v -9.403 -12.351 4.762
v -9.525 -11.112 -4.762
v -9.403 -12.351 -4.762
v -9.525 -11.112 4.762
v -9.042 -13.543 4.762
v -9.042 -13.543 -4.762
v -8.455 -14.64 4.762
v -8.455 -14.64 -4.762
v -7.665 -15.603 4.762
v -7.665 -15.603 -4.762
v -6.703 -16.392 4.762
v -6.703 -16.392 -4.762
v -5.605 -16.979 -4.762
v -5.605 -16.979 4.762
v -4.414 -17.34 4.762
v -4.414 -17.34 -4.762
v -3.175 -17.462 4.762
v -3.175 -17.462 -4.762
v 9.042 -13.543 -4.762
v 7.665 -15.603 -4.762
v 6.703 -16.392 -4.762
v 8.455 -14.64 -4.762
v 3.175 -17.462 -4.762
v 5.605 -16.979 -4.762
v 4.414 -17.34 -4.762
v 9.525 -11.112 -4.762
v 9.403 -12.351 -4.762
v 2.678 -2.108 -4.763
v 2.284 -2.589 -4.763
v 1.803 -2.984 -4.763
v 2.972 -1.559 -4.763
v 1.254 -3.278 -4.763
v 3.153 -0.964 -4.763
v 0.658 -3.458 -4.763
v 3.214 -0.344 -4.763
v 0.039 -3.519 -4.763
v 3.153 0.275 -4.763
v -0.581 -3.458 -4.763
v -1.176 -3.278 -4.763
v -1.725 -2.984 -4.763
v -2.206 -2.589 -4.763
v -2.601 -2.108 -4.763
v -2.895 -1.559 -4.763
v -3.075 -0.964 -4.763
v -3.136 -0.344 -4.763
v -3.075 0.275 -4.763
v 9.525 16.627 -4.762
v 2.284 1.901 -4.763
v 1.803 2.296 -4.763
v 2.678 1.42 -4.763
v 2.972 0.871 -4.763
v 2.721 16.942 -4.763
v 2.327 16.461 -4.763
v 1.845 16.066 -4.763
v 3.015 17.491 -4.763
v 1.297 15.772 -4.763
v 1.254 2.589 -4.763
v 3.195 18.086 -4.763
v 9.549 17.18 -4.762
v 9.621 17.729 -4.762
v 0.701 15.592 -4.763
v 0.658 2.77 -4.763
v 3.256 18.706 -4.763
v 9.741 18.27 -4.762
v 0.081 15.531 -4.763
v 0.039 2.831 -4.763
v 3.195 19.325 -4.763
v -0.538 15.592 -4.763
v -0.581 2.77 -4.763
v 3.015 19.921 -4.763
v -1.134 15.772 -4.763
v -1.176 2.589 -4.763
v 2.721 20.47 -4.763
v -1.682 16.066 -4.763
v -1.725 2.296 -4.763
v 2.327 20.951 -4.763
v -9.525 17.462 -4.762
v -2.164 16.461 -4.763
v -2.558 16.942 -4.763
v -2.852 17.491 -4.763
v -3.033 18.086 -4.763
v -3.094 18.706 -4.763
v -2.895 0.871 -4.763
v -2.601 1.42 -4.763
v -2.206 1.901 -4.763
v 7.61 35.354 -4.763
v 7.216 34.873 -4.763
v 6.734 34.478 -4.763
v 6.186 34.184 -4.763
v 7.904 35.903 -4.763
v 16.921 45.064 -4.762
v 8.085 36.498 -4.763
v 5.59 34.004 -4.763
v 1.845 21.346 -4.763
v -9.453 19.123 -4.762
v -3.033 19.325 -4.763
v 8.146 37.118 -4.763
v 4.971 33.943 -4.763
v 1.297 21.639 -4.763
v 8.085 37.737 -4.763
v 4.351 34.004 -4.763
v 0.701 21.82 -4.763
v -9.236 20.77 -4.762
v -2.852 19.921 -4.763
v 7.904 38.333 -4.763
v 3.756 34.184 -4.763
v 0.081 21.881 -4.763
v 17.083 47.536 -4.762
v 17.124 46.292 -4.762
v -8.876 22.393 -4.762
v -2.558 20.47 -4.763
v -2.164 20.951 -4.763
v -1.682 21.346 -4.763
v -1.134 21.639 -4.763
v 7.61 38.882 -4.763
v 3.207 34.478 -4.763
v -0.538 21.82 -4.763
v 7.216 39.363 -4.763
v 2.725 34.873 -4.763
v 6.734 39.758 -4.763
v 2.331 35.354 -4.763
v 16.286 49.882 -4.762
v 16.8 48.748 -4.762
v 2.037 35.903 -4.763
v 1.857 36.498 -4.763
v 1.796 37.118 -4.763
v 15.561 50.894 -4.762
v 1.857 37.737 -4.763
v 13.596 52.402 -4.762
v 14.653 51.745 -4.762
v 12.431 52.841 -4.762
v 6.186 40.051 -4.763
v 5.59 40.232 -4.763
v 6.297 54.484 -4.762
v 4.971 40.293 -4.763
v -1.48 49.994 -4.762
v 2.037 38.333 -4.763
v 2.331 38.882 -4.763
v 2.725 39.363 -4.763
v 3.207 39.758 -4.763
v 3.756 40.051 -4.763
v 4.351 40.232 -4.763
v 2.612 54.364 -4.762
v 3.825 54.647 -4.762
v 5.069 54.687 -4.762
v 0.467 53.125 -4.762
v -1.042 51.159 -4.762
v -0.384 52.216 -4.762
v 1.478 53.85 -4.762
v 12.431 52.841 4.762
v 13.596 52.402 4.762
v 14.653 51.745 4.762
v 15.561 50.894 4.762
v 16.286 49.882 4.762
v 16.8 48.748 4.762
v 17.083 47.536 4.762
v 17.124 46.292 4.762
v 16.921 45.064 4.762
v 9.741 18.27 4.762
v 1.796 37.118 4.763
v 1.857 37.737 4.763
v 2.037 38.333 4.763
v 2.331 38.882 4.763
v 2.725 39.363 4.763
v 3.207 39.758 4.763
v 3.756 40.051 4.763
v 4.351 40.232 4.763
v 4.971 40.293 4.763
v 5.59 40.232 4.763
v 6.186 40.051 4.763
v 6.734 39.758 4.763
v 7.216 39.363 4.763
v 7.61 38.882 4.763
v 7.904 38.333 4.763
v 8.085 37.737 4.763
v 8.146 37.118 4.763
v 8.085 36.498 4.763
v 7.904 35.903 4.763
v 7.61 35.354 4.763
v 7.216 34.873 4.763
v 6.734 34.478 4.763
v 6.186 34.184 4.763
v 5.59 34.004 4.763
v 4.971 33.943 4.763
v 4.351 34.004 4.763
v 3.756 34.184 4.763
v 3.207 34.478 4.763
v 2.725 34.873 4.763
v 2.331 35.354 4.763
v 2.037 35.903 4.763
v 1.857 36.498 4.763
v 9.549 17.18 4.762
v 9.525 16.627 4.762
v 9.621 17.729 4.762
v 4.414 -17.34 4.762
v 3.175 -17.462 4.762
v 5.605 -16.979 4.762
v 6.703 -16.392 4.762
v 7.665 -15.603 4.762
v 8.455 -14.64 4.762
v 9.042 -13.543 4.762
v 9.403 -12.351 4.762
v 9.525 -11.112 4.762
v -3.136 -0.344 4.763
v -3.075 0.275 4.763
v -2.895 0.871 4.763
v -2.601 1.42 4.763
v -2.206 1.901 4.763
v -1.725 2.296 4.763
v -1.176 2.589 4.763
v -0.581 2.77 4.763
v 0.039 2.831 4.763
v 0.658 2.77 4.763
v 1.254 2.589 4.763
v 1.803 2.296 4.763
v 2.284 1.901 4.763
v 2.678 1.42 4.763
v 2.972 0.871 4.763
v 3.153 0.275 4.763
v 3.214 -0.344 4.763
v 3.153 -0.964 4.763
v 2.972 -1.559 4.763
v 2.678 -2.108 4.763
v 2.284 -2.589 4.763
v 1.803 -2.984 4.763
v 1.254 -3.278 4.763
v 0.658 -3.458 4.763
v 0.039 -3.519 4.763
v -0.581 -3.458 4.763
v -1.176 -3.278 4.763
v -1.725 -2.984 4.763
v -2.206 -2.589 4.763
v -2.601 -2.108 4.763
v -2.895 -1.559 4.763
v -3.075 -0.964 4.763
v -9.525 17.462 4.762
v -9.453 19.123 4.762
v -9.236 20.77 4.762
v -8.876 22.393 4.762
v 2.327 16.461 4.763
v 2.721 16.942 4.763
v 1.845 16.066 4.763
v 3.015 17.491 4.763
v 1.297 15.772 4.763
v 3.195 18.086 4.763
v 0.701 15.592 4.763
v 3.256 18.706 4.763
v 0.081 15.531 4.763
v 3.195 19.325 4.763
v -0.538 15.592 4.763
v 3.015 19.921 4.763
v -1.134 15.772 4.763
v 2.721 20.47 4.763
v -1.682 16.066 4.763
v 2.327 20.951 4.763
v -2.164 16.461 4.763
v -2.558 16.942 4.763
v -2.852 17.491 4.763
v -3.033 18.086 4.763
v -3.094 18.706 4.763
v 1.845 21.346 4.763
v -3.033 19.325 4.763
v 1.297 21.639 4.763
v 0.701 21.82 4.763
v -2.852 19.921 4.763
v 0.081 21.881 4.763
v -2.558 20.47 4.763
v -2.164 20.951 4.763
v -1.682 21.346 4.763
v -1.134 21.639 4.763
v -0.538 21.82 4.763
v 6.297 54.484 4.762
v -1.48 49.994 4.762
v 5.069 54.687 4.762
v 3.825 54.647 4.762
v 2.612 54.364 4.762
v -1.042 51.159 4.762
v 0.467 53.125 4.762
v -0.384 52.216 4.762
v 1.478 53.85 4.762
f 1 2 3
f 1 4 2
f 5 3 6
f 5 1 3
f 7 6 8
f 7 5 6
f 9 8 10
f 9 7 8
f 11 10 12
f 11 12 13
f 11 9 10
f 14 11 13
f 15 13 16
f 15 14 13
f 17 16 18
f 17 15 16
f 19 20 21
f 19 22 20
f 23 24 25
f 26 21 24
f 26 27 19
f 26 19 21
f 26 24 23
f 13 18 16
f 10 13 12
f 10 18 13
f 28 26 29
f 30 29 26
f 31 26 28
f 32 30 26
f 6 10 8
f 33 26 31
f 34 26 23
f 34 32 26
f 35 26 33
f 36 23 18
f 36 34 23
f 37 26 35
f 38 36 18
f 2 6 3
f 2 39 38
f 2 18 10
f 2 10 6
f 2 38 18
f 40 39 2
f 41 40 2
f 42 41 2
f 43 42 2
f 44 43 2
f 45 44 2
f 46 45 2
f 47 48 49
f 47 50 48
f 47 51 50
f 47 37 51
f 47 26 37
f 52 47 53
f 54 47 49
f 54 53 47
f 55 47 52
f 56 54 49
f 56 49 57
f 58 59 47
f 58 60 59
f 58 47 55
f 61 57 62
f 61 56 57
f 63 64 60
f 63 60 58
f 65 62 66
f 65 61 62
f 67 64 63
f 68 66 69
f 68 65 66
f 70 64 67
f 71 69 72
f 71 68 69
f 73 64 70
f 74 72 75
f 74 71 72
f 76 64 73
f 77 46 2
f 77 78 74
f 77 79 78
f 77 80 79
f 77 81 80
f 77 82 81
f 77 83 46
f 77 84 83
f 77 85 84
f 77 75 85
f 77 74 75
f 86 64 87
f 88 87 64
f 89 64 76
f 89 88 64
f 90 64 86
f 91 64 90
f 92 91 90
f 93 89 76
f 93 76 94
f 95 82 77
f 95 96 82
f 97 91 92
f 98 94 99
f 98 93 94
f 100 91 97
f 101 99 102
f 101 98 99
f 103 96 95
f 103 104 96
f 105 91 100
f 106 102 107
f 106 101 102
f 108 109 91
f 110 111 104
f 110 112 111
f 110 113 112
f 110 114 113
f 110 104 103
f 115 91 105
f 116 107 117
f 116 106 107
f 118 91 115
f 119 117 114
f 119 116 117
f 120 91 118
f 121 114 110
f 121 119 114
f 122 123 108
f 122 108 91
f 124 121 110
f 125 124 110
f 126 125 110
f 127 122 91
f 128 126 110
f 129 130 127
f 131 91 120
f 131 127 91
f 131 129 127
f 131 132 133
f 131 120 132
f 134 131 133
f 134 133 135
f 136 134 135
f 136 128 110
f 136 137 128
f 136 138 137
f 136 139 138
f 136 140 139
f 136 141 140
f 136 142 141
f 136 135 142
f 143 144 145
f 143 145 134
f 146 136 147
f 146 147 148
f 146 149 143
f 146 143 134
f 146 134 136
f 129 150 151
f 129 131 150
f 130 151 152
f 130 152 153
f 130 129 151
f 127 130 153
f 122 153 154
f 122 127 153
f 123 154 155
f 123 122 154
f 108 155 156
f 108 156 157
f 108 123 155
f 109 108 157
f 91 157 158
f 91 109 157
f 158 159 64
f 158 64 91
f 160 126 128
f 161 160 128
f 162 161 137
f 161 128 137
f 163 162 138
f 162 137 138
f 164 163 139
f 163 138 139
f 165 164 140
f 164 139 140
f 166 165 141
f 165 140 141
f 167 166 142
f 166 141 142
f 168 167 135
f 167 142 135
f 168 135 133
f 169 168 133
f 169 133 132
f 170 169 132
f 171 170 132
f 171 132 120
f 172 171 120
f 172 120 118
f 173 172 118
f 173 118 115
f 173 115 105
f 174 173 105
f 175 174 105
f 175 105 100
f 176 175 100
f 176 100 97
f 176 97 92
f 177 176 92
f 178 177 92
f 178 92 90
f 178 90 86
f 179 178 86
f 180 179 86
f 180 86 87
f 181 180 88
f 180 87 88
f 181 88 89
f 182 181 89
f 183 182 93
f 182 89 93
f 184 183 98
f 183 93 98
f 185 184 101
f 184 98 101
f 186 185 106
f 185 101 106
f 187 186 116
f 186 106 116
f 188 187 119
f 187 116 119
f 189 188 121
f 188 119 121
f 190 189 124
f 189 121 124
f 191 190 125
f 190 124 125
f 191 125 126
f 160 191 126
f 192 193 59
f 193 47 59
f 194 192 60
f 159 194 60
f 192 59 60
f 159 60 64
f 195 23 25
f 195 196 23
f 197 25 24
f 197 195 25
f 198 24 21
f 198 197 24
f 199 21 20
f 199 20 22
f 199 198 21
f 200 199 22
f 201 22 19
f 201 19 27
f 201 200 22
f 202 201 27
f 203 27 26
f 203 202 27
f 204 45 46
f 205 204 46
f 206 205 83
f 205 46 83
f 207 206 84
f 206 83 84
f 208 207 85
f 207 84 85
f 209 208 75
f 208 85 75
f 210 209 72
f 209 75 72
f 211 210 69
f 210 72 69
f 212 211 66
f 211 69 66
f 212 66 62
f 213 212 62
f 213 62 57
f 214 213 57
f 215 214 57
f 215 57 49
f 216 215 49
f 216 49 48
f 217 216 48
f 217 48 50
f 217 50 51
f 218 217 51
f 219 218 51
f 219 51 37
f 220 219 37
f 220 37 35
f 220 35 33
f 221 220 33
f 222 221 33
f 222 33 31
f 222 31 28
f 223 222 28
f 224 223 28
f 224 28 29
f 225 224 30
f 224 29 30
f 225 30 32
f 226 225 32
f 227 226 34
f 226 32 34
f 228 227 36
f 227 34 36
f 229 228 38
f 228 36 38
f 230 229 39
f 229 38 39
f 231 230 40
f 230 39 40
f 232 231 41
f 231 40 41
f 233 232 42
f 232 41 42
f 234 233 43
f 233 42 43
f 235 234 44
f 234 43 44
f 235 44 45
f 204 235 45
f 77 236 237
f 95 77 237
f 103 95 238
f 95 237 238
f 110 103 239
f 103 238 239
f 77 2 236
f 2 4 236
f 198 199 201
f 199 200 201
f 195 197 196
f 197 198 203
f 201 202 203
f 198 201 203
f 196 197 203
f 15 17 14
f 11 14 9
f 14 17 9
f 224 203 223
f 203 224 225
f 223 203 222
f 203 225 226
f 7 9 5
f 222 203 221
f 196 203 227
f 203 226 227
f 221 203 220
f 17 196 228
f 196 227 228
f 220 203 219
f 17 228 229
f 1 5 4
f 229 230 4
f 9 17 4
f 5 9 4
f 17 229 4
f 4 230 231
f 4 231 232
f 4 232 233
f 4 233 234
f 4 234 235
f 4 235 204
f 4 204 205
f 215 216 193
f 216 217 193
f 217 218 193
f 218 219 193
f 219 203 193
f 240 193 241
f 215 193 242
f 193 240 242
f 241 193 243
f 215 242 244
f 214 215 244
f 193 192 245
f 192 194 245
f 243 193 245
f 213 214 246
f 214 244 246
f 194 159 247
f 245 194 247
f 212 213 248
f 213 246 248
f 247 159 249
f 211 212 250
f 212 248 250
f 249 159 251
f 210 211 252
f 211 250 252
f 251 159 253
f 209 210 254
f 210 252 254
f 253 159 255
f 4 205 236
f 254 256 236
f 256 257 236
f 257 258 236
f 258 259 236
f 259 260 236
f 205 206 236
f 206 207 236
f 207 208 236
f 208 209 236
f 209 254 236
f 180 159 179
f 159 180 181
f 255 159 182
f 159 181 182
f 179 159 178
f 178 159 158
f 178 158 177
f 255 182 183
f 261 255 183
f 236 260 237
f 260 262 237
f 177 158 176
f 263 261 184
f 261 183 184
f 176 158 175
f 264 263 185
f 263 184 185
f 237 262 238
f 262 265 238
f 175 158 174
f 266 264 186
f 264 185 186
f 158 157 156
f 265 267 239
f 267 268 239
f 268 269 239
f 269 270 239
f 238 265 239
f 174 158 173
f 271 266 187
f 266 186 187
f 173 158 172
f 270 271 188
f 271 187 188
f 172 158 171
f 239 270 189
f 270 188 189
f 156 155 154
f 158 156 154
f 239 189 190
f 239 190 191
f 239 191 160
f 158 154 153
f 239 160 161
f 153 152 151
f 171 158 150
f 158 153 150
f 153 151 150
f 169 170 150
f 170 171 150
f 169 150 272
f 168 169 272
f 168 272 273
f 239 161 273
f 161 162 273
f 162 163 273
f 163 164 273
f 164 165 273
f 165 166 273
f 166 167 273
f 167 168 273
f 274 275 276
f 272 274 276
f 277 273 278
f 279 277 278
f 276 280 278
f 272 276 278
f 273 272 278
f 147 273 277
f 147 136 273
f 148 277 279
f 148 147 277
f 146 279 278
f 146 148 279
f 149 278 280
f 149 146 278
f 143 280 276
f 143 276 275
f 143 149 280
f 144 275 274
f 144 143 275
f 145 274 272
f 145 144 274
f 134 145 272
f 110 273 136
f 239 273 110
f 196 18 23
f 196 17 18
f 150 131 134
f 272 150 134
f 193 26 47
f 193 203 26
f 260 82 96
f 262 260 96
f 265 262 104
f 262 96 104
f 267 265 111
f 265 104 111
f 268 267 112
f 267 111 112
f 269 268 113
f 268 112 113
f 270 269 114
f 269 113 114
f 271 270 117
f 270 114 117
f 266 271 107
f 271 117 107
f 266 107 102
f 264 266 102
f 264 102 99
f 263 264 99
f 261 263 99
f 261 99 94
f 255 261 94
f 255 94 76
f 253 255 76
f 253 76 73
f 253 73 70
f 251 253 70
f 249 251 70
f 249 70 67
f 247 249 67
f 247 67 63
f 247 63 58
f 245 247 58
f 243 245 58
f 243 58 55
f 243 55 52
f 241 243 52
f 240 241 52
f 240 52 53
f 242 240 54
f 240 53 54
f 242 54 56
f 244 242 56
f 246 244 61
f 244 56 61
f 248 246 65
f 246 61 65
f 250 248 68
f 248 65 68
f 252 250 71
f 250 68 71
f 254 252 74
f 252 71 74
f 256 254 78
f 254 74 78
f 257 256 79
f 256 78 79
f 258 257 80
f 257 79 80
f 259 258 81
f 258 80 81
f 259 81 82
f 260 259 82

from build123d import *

# Parameters (mm, degrees)
SKETCH1_W                   = 19.05
SKETCH1_H                   = 34.925
BOSS_EXTRUDE1_DEPTH         = 4.7625
BOSS_EXTRUDE2_DEPTH         = 9.525
BOSS_EXTRUDE3_DEPTH         = 9.525
F_1_4_0_25_DIAMETER_HOLE1_D = 6.35
FILLET1_R                   = 6.35


with BuildPart() as part:
    # Sketch1 → Boss-Extrude1 (new, symmetric)
    with BuildSketch(Plane.XY):
        Rectangle(SKETCH1_W, SKETCH1_H)
    extrude(amount=BOSS_EXTRUDE1_DEPTH, both=True)



with BuildPart() as body_2:
    # Sketch2 → Boss-Extrude2 (new body)
    with BuildSketch(Plane.XY.offset(4.7625)):
        Polygon((9.525, 17.4625), (18.56425515, 51.197459483), (0.163368159, 56.127962292), (-8.875886991, 22.393002809), align=None)
    extrude(amount=-BOSS_EXTRUDE2_DEPTH)


with BuildPart() as part_1:
    add(part.part)

    add(body_2.part)  # Boss-Extrude3 merges body 2
    # Sketch3 → Boss-Extrude3 (add)
    with BuildSketch(Plane.XY.offset(4.7625)):
        with BuildLine():
            Line((-8.875886991, 22.393002809), (9.525, 17.4625))
            Line((9.525, 17.4625), (-9.525, 17.4625))
            ThreePointArc((-9.525, 17.4625), (-9.362024609, 19.949023962), (-8.875886991, 22.393002809))
        make_face()
    extrude(amount=-BOSS_EXTRUDE3_DEPTH)

    # 1/4 (0.25) Diameter Hole1 (through all)
    with Locations(Plane.XY.offset(4.7625)):
        with Locations((0.038567729, -0.344238019), (0.081487695, 18.705761981), (4.970520592, 37.117710746)):
            Hole(F_1_4_0_25_DIAMETER_HOLE1_D / 2)

    # Fillet1
    fillet1_edges = [part_1.edges().sort_by_distance(p)[0] for p in [
        (18.56425515, 51.197459483, 0),
        (0.163368159, 56.127962292, 0),
        (9.525, -17.4625, 0),
        (-9.525, -17.4625, 0),
        (9.525, 17.4625, 0),
    ]]
    fillet(fillet1_edges, radius=FILLET1_R)


solid = part_1.part
